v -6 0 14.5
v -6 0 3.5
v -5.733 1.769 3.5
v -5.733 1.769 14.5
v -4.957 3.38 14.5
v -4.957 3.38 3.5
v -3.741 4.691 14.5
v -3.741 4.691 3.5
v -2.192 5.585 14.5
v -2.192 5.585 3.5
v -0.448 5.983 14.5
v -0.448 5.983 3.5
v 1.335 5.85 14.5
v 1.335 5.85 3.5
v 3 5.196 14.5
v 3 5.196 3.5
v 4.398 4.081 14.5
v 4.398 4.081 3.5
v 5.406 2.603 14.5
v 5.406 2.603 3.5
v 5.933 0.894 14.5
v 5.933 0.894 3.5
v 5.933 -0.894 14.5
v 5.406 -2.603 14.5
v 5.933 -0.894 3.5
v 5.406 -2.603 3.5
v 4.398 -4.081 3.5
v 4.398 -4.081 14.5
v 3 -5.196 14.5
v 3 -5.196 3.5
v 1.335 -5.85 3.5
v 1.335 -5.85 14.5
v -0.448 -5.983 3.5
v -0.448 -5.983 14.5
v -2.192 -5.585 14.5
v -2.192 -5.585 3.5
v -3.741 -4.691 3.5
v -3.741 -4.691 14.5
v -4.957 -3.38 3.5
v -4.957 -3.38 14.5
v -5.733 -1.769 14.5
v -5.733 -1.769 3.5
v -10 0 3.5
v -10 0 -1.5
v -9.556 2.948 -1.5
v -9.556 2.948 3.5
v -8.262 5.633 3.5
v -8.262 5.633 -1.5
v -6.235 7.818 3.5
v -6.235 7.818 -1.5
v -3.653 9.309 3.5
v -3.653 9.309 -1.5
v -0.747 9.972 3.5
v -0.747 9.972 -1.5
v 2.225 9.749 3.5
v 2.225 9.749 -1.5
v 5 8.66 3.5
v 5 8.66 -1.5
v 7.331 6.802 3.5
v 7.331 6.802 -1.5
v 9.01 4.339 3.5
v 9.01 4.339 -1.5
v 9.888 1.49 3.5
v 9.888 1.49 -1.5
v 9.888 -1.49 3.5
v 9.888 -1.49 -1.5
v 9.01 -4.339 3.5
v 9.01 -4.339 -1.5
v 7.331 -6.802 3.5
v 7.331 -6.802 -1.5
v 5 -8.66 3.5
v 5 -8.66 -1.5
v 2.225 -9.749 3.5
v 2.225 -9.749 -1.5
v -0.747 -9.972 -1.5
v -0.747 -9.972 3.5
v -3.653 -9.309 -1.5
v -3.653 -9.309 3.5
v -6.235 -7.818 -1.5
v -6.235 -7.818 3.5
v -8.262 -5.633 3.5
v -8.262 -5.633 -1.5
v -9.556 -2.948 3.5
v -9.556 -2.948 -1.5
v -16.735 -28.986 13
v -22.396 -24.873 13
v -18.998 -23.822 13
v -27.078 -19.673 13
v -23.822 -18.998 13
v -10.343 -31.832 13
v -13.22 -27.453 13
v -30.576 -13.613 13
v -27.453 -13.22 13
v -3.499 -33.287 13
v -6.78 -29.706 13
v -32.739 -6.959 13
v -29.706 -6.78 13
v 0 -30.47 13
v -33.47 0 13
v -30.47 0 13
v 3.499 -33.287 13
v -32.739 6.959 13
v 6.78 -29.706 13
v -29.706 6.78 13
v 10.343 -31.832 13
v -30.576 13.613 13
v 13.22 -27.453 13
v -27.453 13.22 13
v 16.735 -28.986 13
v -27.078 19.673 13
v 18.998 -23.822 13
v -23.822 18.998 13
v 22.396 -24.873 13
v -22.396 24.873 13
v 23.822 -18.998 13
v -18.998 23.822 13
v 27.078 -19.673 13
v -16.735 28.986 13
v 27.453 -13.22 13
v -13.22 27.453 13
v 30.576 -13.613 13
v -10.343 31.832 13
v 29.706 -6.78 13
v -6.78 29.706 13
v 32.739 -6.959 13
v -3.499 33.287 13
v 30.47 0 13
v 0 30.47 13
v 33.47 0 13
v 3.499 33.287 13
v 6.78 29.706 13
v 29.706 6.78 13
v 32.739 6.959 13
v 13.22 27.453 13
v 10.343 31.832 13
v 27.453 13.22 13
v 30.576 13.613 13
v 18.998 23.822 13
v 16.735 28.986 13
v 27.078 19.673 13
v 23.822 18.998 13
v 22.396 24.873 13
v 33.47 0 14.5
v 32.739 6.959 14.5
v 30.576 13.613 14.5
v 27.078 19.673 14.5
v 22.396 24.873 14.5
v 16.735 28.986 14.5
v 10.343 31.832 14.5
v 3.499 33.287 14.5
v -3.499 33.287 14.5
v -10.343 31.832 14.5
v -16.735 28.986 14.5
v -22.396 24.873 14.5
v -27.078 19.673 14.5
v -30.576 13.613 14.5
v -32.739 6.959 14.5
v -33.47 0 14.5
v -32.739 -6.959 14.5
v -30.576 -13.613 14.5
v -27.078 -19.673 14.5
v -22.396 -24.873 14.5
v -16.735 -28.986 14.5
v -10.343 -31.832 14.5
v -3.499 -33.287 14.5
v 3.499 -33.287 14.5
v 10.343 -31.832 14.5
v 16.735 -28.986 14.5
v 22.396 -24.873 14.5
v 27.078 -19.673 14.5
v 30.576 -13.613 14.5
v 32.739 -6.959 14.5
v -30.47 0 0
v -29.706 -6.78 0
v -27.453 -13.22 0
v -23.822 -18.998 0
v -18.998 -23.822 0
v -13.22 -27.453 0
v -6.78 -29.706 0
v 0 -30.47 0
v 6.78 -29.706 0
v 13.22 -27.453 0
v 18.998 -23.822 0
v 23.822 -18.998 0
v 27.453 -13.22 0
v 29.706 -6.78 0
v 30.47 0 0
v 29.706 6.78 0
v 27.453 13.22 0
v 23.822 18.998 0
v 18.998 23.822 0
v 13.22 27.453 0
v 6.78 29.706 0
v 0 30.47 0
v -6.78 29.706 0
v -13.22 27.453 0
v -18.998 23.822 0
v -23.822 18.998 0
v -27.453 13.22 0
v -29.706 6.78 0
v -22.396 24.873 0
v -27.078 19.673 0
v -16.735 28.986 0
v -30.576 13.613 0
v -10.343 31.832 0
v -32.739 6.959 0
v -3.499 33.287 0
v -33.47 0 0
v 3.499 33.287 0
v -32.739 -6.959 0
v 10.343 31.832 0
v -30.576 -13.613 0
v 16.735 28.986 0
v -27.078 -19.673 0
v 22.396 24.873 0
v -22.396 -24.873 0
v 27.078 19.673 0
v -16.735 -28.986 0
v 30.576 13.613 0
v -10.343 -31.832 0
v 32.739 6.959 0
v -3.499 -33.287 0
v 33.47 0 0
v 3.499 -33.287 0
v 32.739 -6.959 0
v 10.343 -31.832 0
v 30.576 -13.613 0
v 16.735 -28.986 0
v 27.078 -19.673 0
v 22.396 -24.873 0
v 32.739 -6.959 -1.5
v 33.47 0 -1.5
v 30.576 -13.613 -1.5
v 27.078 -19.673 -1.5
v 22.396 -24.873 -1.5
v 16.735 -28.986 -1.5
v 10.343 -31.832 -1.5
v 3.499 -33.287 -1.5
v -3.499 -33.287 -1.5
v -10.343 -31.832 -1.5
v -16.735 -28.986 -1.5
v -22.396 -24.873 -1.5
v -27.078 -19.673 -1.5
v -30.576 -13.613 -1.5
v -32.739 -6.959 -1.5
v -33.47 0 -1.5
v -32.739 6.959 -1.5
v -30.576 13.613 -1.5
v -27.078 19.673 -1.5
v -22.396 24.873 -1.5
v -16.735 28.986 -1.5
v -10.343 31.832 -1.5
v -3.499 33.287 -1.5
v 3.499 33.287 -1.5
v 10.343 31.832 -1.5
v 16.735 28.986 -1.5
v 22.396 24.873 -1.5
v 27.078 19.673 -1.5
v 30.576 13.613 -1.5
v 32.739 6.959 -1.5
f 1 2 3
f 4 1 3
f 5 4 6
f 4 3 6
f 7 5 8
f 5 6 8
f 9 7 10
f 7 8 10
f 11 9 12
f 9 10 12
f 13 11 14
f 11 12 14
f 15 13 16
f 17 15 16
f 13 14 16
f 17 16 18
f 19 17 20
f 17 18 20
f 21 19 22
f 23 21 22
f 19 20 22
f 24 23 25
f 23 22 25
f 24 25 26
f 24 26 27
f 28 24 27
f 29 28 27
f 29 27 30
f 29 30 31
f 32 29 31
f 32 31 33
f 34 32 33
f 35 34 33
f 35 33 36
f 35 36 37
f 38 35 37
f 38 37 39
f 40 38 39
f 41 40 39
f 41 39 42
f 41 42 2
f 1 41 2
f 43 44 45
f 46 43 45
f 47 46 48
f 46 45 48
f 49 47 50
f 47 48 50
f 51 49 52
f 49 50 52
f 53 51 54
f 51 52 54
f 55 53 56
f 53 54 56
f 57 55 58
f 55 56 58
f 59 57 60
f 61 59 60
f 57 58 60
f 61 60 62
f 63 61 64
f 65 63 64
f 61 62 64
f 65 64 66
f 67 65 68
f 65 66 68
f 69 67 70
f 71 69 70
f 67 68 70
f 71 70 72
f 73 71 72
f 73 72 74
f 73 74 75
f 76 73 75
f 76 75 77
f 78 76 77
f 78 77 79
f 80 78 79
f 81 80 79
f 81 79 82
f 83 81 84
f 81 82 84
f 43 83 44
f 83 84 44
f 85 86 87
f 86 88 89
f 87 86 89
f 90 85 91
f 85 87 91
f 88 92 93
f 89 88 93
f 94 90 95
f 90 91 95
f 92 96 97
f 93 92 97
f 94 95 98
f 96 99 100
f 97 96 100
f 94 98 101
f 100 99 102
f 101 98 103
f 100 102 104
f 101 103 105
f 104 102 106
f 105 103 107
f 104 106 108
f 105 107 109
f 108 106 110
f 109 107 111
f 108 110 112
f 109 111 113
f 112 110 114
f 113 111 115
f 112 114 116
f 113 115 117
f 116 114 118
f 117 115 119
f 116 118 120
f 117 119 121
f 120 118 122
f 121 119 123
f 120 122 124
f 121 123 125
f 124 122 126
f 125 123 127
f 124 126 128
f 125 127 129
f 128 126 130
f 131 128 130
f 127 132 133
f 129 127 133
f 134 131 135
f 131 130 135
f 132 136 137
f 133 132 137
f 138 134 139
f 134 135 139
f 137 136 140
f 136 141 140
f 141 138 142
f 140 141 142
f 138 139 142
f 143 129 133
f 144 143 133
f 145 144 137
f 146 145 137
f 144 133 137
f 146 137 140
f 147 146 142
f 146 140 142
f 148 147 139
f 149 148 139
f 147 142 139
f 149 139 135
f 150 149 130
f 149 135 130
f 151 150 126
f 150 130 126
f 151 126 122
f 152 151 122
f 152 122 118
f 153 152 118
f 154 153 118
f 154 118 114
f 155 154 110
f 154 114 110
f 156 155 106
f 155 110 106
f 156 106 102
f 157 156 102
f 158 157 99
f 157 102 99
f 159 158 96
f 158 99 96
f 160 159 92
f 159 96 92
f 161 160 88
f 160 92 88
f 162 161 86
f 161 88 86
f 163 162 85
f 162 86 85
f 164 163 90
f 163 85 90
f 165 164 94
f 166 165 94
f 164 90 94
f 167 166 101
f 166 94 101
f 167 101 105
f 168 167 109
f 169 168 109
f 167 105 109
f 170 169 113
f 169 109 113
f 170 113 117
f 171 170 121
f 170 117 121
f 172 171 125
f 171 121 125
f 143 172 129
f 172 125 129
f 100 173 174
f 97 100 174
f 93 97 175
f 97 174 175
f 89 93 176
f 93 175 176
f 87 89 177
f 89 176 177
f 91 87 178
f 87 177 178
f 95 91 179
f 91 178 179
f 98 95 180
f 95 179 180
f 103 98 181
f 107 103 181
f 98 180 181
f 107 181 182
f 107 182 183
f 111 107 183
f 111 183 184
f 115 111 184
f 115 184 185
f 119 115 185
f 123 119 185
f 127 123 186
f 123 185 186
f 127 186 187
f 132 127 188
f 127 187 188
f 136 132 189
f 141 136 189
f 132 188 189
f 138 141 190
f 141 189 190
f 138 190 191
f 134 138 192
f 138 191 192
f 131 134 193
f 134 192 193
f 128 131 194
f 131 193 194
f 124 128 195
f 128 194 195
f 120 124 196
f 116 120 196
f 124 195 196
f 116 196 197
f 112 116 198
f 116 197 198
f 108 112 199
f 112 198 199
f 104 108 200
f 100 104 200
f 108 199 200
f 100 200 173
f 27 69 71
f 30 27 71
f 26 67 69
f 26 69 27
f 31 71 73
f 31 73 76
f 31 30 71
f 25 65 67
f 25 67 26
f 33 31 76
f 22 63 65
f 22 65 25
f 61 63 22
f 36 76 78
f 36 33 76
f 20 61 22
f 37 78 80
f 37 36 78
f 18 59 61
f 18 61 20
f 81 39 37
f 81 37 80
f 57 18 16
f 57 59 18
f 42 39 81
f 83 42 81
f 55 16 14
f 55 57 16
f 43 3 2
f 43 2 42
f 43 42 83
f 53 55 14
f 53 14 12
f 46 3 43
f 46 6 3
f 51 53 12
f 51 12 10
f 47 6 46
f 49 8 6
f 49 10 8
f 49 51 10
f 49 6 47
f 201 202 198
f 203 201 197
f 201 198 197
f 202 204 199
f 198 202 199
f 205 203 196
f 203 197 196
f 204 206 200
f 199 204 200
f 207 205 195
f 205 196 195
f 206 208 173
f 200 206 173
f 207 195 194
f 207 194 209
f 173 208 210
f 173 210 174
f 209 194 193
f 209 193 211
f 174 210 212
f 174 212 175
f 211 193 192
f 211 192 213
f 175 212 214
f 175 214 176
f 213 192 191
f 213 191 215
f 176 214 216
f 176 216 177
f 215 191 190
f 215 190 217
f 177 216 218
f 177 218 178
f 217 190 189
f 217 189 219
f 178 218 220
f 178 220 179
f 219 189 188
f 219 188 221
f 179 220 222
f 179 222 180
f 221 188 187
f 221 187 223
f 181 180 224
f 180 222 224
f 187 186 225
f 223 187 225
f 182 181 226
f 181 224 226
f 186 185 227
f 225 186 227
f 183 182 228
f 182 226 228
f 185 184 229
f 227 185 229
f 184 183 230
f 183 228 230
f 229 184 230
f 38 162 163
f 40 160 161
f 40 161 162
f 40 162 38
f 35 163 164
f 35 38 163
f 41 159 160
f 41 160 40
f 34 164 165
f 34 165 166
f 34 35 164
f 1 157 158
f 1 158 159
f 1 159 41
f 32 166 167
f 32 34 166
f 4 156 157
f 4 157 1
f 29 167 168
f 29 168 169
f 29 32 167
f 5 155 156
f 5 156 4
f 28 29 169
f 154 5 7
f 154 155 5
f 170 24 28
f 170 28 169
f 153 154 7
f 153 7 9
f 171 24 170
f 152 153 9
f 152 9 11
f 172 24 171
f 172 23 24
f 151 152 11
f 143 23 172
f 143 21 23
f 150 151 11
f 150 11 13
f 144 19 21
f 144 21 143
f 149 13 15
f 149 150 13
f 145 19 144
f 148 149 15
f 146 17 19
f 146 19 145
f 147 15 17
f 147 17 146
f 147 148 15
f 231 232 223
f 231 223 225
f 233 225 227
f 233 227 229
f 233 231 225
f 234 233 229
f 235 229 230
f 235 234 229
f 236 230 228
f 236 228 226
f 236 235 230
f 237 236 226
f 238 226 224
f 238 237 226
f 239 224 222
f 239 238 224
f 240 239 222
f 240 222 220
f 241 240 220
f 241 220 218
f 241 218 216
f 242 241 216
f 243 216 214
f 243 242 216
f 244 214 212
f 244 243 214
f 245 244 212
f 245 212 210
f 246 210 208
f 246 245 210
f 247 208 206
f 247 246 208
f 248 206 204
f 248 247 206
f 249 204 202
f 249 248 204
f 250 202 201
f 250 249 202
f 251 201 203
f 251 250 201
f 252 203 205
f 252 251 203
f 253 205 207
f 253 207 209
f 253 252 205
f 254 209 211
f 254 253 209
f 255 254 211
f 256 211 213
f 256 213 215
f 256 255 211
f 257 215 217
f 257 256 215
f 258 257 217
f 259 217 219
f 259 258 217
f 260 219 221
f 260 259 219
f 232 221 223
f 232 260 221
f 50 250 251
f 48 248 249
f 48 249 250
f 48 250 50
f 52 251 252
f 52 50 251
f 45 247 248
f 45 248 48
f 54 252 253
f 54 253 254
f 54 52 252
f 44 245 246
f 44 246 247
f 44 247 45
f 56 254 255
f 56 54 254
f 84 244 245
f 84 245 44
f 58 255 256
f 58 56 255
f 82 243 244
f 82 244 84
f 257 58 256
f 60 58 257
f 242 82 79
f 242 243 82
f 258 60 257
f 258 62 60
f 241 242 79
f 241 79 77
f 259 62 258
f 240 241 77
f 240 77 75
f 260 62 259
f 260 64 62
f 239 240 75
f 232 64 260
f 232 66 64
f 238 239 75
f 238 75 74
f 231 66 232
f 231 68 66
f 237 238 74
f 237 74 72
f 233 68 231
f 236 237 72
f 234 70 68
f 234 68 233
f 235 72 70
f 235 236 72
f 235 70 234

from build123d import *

# Parameters (mm, degrees)
SKETCH_1_R          = 30.47
EXTRUDE_1_DEPTH     = 13
SKETCH_2_R          = 33.47
EXTRUDE_2_DEPTH     = 1.5
EXTRUDE_START       = 1.5
SKETCH_3_R          = 33.47
EXTRUDE_3_DEPTH     = 1.5
SKETCH_4_R          = 6
CUT_EXTRUDE_1_DEPTH = 50.964805614
SKETCH_5_R          = 10
CUT_EXTRUDE_2_DEPTH = 5


with BuildPart() as part:
    # 草图1 → 凸台-拉伸1 (new body)
    with BuildSketch(Plane.XY):
        with Locations(Location((0, 0, 0), (0, 0, 180))):
            Circle(SKETCH_1_R)
    extrude(amount=EXTRUDE_1_DEPTH)

    # 草图2 → 凸台-拉伸2 (add)
    with BuildSketch(Plane.XY.offset(13)):
        Circle(SKETCH_2_R)
    extrude(amount=EXTRUDE_2_DEPTH)

    # 草图3 → 凸台-拉伸3 (add)
    with BuildSketch(Plane(origin=(0, 0, 0), x_dir=(-1, 0, 0), z_dir=(0, 0, -1)).offset(EXTRUDE_START)):
        with Locations(Location((0, 0, 0), (0, 0, 180))):
            Circle(SKETCH_3_R)
    extrude(amount=-EXTRUDE_3_DEPTH)

    # 草图4 → 切除-拉伸1 (cut, through all)
    with BuildSketch(Plane(origin=(0, 0, -1.5), x_dir=(-1, 0, 0), z_dir=(0, 0, -1))):
        Circle(SKETCH_4_R)
    extrude(amount=-CUT_EXTRUDE_1_DEPTH, mode=Mode.SUBTRACT)

    # 草图5 → 切除-拉伸2 (cut)
    with BuildSketch(Plane(origin=(0, 0, -1.5), x_dir=(-1, 0, 0), z_dir=(0, 0, -1))):
        Circle(SKETCH_5_R)
    extrude(amount=-CUT_EXTRUDE_2_DEPTH, mode=Mode.SUBTRACT)


solid = part.part
